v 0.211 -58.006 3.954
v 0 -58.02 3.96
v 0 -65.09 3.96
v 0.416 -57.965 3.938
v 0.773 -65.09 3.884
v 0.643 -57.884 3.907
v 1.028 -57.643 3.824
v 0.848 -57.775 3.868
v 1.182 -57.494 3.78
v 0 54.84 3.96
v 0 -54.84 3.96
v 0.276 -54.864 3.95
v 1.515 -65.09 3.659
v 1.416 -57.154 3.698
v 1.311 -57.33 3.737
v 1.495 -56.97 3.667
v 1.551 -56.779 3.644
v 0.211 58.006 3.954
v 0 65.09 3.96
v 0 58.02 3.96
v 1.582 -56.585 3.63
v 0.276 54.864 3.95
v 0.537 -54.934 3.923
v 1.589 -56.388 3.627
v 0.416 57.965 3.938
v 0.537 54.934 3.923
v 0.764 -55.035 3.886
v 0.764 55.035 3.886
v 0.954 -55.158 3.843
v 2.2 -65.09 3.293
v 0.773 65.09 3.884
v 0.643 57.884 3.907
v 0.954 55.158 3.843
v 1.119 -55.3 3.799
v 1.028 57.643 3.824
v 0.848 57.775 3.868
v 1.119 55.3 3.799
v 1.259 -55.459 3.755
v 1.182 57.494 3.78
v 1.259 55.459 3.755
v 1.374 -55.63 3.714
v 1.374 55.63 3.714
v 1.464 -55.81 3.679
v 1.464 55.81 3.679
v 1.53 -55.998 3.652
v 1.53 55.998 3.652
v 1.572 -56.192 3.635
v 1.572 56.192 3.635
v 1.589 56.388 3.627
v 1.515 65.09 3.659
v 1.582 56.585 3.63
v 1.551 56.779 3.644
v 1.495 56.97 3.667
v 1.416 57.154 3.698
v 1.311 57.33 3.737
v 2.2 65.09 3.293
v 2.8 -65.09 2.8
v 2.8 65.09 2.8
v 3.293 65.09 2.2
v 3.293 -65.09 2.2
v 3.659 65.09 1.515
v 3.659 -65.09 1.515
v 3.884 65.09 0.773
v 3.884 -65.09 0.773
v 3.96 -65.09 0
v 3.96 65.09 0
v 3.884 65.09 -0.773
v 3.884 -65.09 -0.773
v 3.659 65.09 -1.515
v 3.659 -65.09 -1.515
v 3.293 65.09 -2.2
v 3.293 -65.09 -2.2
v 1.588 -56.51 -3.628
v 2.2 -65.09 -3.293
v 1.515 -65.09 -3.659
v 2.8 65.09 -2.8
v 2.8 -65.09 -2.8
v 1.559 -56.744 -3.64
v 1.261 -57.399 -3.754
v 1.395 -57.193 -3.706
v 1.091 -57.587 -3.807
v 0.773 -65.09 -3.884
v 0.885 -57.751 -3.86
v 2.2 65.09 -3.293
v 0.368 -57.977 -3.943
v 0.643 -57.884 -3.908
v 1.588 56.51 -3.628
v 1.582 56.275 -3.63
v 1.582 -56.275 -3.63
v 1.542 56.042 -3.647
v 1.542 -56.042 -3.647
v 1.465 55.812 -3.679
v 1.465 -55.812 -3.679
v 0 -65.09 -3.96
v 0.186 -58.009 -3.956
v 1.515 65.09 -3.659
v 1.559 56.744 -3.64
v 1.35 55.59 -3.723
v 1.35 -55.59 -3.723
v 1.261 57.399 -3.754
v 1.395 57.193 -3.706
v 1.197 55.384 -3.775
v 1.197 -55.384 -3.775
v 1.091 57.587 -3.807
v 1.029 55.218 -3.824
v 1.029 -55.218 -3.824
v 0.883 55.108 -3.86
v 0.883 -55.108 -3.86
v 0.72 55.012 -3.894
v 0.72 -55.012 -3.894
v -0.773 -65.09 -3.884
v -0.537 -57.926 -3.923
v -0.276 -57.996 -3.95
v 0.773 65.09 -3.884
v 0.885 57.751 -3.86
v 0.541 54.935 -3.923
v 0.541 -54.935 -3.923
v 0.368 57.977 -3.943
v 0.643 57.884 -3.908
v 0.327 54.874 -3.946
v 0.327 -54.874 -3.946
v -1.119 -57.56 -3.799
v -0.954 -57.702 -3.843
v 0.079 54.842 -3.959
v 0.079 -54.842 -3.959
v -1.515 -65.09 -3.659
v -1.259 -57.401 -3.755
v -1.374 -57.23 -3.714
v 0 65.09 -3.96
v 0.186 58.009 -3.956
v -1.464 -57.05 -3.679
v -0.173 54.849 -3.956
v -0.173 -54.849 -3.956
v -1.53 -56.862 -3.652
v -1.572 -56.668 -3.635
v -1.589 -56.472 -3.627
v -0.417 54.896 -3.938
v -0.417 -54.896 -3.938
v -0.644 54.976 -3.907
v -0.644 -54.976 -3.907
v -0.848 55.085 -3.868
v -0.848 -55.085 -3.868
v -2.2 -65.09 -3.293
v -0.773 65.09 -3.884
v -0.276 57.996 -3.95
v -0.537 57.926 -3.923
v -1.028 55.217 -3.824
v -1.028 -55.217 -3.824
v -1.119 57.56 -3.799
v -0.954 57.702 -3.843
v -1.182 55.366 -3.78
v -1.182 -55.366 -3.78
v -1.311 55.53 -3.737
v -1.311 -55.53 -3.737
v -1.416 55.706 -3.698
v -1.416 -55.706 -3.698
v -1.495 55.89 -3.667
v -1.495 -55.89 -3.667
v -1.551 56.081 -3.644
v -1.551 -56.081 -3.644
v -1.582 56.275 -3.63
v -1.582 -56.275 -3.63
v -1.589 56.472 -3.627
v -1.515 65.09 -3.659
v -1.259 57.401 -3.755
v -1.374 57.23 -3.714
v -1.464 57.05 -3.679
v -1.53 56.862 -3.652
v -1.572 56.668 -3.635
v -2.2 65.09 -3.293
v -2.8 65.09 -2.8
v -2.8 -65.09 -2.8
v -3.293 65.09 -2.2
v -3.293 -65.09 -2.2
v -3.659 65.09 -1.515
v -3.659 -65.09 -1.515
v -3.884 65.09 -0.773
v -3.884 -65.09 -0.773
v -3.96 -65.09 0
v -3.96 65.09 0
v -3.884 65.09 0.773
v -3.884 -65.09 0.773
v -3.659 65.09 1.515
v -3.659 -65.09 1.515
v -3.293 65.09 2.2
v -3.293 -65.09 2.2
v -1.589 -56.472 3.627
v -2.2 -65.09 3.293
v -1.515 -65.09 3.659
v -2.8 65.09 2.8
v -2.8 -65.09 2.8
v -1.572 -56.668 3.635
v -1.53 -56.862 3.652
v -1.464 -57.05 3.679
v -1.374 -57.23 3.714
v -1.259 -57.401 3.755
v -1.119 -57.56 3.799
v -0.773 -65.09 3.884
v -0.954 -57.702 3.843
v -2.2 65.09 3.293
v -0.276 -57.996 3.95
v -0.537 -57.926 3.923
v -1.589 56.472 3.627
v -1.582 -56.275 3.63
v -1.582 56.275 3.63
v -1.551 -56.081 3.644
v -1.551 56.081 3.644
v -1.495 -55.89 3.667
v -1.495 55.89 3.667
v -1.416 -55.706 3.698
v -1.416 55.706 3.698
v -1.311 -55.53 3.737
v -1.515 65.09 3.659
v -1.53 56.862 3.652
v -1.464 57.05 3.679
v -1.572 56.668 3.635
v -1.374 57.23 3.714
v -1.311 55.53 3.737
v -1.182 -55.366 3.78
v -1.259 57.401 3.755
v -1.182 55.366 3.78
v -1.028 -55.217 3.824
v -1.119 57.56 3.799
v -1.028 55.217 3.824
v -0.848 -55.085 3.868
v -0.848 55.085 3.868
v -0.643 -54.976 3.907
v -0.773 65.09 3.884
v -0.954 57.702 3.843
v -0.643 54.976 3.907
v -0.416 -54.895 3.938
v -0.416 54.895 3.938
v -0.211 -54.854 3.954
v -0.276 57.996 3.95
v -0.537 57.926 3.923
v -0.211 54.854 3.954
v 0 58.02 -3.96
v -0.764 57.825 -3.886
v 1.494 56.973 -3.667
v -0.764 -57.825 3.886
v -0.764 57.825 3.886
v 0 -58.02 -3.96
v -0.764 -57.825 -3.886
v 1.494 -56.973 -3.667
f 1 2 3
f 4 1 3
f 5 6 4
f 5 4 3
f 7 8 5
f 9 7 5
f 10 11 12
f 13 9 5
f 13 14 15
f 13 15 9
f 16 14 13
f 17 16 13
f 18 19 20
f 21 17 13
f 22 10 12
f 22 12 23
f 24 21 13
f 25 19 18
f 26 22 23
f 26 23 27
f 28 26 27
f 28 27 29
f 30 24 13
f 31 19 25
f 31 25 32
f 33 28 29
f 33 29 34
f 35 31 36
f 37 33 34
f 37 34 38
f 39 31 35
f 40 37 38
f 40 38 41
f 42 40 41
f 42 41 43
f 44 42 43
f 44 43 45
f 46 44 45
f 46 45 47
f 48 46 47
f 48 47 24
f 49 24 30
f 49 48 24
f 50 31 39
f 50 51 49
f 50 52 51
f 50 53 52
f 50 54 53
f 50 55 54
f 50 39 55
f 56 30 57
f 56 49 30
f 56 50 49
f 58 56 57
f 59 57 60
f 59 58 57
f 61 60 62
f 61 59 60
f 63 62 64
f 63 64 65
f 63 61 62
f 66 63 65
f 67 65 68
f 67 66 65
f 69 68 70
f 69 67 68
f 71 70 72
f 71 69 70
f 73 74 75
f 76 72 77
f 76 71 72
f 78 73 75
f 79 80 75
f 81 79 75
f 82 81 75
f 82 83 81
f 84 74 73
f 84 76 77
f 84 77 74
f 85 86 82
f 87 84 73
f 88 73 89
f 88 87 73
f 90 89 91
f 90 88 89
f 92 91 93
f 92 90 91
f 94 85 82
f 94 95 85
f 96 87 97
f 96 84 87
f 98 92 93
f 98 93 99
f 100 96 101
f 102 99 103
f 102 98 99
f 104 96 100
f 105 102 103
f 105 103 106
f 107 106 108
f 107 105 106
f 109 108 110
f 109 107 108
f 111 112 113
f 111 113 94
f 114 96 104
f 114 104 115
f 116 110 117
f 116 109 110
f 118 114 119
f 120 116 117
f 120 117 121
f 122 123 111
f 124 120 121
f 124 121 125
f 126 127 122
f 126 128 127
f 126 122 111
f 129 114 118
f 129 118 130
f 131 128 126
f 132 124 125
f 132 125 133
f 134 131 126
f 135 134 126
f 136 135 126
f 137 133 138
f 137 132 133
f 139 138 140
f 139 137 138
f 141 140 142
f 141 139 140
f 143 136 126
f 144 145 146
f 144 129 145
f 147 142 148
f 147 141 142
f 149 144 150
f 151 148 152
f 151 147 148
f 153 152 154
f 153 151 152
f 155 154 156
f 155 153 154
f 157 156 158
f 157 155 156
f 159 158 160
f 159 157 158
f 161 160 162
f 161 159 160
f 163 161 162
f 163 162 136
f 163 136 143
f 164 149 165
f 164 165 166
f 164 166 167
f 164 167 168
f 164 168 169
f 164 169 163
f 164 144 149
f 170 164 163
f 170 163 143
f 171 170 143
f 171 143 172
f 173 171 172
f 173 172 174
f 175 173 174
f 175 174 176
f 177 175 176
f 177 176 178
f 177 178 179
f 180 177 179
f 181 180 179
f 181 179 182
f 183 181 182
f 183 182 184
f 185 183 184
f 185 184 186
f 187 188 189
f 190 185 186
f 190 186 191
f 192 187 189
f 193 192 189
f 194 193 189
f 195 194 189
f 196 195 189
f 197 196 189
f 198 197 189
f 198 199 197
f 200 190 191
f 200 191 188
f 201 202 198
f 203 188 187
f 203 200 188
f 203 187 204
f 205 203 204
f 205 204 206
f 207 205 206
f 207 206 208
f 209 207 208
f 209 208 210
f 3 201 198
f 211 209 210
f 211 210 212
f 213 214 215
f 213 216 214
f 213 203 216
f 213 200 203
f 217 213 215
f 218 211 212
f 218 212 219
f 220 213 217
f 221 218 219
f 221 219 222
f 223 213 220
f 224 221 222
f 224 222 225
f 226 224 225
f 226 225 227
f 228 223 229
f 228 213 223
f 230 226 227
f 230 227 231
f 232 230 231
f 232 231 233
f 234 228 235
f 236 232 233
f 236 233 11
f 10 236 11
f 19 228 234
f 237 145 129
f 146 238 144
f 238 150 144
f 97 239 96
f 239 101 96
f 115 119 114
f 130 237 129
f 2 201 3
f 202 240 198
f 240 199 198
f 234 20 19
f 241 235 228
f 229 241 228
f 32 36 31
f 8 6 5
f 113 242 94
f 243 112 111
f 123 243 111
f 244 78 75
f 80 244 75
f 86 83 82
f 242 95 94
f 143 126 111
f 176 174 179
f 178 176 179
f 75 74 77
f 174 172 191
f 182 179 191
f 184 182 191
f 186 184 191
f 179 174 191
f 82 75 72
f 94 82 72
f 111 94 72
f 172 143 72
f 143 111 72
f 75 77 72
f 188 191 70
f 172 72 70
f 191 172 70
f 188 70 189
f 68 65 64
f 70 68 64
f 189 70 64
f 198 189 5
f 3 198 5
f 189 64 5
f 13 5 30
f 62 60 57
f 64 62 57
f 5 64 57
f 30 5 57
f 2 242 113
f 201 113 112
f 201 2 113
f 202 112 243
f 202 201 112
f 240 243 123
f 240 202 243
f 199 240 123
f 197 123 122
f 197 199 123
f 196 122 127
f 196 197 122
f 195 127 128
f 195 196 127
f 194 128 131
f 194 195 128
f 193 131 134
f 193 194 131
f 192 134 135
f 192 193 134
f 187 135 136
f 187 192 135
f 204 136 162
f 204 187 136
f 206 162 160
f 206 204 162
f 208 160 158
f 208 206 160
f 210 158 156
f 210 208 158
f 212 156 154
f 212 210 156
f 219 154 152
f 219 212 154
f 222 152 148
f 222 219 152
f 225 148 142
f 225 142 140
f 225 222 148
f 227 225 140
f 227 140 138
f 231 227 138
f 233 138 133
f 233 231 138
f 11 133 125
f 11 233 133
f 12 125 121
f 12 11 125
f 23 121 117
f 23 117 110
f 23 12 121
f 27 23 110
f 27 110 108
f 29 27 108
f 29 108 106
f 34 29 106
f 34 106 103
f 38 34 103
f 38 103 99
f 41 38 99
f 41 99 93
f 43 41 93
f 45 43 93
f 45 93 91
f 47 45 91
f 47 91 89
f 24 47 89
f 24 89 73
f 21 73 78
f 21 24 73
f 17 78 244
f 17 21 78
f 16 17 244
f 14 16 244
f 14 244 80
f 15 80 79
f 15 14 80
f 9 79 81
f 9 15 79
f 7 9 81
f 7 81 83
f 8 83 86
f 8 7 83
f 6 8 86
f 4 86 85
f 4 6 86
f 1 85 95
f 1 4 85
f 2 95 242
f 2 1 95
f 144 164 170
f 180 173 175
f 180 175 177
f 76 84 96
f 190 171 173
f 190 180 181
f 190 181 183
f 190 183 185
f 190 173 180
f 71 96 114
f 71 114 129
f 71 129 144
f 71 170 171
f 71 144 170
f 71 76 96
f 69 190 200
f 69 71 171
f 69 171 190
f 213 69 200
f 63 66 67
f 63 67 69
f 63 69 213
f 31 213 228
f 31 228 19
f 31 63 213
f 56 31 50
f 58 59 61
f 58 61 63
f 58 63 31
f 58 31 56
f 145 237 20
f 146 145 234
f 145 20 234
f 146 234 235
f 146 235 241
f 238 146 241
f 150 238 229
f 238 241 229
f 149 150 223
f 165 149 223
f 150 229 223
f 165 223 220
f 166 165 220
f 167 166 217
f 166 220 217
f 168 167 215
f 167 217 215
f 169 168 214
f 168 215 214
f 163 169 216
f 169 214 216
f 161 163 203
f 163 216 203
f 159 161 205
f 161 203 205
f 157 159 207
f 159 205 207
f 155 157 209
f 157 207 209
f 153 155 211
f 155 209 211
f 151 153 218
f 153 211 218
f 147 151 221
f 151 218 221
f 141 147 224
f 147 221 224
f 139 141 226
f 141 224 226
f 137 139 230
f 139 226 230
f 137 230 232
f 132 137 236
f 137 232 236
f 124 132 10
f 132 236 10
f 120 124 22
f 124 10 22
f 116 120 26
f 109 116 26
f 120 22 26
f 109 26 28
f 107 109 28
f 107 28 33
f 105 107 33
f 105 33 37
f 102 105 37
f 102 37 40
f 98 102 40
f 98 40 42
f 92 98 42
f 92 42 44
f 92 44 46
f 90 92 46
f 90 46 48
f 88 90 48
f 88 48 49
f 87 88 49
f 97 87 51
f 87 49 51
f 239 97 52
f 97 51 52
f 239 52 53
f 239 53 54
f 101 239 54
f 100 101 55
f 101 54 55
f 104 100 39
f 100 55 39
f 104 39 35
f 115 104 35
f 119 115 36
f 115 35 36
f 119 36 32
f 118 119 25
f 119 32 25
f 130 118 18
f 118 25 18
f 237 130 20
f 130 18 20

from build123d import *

# Parameters (mm, degrees)
SKETCH1_R           = 3.96
BOSS_EXTRUDE1_DEPTH = 65.09
SKETCH2_R           = 1.59
CUT_EXTRUDE1_DEPTH  = 66.330477574


with BuildPart() as part:
    # Sketch1 → Boss-Extrude1 (new, symmetric)
    with BuildSketch(Plane(origin=(0, 0, 0), x_dir=(1, 0, 0), z_dir=(0, 1, 0))):
        Circle(SKETCH1_R)
    extrude(amount=BOSS_EXTRUDE1_DEPTH, both=True)

    # Sketch2 → Cut-Extrude1 (cut, symmetric)
    with BuildSketch(Plane.XY):
        with Locations((0, 56.43)):
            Circle(SKETCH2_R)
    cut_extrude1 = extrude(amount=CUT_EXTRUDE1_DEPTH, both=True, mode=Mode.SUBTRACT)

    # Mirror1: Cut-Extrude1 across plane
    add(cut_extrude1.mirror(Plane.ZX), mode=Mode.SUBTRACT)


solid = part.part
